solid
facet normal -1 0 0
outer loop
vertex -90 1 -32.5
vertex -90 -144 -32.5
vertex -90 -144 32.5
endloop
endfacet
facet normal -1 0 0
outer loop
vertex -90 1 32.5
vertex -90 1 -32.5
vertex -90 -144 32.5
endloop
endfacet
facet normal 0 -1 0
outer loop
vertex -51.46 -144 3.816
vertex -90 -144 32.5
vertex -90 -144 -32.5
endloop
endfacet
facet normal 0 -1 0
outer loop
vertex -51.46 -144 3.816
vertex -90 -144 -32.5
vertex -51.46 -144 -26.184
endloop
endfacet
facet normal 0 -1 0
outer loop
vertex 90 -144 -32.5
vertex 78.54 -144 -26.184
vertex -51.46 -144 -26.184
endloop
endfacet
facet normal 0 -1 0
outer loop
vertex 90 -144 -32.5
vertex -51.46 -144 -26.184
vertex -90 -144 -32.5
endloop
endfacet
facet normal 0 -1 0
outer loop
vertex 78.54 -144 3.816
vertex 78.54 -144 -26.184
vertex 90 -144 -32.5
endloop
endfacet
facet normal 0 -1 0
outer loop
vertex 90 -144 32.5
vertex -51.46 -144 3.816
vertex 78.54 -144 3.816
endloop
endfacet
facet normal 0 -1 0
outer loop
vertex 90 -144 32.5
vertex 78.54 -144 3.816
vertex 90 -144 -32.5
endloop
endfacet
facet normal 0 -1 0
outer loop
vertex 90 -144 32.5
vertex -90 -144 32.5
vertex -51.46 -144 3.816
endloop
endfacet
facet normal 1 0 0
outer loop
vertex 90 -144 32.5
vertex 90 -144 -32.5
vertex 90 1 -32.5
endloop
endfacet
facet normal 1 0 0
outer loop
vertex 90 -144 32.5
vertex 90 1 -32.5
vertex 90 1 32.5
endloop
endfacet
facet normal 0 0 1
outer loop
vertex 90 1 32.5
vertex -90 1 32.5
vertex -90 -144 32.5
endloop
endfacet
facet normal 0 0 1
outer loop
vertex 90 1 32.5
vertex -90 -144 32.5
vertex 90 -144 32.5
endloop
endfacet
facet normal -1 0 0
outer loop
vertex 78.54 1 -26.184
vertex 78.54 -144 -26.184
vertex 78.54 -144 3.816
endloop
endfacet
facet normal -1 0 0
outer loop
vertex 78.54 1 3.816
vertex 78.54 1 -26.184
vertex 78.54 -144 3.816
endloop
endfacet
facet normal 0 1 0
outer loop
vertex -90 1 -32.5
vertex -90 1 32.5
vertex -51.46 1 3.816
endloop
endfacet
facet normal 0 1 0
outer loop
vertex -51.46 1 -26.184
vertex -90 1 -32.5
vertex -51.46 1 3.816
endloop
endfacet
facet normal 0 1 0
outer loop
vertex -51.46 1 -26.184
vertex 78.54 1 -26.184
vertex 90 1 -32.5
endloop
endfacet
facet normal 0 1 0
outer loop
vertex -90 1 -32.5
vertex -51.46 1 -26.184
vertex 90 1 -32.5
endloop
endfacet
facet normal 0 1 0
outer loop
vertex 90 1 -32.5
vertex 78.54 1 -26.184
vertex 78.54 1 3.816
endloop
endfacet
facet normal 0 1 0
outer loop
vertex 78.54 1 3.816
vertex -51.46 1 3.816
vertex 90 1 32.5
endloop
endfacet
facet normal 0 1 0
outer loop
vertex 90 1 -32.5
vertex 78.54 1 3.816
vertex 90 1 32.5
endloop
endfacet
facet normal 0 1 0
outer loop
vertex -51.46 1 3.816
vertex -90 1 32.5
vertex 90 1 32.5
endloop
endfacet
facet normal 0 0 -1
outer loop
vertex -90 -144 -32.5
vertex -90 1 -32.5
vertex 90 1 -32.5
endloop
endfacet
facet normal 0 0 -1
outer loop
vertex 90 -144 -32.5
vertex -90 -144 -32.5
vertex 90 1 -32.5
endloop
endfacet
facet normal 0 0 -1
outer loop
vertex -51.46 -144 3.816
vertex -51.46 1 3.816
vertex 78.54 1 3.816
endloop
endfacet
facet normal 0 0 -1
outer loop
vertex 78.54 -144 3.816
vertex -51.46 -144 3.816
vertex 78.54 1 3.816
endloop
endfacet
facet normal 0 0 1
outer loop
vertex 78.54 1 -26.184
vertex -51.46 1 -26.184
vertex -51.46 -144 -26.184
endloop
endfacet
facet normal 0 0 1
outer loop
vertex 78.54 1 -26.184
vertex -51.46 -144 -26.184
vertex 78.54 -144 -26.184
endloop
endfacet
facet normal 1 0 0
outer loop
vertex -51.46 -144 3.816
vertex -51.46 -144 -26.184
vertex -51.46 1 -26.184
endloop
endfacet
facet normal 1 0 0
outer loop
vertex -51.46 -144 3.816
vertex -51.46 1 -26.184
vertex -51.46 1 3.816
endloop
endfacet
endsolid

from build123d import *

# Parameters (mm, degrees)
SKETCH003_W  = 130
SKETCH003_H  = 30
PAD003_DEPTH = 150
SKETCH002_W  = 180
SKETCH002_H  = 65
PAD002_DEPTH = 145


with BuildPart() as body002:
    # Sketch003 → Pad003 (new body)
    with BuildSketch(Plane.XZ):
        with Locations((13.539826, -11.184382)):
            Rectangle(SKETCH003_W, SKETCH003_H)
    extrude(amount=PAD003_DEPTH)


with BuildPart() as body002_1:
    # Body002 placement: moved
    add(body002.part.moved(Location((0, 2, 0))))


with BuildPart() as cut:
    # Sketch002 → Pad002 (new body)
    with BuildSketch(Plane.XZ):
        Rectangle(SKETCH002_W, SKETCH002_H)
    extrude(amount=PAD002_DEPTH)

    # Cut: cut Body002
    add(body002_1.part, mode=Mode.SUBTRACT)


with BuildPart() as cut_1:
    # Cut placement: moved
    add(cut.part.moved(Location((0, 1, 0))))


solid = cut_1.part
